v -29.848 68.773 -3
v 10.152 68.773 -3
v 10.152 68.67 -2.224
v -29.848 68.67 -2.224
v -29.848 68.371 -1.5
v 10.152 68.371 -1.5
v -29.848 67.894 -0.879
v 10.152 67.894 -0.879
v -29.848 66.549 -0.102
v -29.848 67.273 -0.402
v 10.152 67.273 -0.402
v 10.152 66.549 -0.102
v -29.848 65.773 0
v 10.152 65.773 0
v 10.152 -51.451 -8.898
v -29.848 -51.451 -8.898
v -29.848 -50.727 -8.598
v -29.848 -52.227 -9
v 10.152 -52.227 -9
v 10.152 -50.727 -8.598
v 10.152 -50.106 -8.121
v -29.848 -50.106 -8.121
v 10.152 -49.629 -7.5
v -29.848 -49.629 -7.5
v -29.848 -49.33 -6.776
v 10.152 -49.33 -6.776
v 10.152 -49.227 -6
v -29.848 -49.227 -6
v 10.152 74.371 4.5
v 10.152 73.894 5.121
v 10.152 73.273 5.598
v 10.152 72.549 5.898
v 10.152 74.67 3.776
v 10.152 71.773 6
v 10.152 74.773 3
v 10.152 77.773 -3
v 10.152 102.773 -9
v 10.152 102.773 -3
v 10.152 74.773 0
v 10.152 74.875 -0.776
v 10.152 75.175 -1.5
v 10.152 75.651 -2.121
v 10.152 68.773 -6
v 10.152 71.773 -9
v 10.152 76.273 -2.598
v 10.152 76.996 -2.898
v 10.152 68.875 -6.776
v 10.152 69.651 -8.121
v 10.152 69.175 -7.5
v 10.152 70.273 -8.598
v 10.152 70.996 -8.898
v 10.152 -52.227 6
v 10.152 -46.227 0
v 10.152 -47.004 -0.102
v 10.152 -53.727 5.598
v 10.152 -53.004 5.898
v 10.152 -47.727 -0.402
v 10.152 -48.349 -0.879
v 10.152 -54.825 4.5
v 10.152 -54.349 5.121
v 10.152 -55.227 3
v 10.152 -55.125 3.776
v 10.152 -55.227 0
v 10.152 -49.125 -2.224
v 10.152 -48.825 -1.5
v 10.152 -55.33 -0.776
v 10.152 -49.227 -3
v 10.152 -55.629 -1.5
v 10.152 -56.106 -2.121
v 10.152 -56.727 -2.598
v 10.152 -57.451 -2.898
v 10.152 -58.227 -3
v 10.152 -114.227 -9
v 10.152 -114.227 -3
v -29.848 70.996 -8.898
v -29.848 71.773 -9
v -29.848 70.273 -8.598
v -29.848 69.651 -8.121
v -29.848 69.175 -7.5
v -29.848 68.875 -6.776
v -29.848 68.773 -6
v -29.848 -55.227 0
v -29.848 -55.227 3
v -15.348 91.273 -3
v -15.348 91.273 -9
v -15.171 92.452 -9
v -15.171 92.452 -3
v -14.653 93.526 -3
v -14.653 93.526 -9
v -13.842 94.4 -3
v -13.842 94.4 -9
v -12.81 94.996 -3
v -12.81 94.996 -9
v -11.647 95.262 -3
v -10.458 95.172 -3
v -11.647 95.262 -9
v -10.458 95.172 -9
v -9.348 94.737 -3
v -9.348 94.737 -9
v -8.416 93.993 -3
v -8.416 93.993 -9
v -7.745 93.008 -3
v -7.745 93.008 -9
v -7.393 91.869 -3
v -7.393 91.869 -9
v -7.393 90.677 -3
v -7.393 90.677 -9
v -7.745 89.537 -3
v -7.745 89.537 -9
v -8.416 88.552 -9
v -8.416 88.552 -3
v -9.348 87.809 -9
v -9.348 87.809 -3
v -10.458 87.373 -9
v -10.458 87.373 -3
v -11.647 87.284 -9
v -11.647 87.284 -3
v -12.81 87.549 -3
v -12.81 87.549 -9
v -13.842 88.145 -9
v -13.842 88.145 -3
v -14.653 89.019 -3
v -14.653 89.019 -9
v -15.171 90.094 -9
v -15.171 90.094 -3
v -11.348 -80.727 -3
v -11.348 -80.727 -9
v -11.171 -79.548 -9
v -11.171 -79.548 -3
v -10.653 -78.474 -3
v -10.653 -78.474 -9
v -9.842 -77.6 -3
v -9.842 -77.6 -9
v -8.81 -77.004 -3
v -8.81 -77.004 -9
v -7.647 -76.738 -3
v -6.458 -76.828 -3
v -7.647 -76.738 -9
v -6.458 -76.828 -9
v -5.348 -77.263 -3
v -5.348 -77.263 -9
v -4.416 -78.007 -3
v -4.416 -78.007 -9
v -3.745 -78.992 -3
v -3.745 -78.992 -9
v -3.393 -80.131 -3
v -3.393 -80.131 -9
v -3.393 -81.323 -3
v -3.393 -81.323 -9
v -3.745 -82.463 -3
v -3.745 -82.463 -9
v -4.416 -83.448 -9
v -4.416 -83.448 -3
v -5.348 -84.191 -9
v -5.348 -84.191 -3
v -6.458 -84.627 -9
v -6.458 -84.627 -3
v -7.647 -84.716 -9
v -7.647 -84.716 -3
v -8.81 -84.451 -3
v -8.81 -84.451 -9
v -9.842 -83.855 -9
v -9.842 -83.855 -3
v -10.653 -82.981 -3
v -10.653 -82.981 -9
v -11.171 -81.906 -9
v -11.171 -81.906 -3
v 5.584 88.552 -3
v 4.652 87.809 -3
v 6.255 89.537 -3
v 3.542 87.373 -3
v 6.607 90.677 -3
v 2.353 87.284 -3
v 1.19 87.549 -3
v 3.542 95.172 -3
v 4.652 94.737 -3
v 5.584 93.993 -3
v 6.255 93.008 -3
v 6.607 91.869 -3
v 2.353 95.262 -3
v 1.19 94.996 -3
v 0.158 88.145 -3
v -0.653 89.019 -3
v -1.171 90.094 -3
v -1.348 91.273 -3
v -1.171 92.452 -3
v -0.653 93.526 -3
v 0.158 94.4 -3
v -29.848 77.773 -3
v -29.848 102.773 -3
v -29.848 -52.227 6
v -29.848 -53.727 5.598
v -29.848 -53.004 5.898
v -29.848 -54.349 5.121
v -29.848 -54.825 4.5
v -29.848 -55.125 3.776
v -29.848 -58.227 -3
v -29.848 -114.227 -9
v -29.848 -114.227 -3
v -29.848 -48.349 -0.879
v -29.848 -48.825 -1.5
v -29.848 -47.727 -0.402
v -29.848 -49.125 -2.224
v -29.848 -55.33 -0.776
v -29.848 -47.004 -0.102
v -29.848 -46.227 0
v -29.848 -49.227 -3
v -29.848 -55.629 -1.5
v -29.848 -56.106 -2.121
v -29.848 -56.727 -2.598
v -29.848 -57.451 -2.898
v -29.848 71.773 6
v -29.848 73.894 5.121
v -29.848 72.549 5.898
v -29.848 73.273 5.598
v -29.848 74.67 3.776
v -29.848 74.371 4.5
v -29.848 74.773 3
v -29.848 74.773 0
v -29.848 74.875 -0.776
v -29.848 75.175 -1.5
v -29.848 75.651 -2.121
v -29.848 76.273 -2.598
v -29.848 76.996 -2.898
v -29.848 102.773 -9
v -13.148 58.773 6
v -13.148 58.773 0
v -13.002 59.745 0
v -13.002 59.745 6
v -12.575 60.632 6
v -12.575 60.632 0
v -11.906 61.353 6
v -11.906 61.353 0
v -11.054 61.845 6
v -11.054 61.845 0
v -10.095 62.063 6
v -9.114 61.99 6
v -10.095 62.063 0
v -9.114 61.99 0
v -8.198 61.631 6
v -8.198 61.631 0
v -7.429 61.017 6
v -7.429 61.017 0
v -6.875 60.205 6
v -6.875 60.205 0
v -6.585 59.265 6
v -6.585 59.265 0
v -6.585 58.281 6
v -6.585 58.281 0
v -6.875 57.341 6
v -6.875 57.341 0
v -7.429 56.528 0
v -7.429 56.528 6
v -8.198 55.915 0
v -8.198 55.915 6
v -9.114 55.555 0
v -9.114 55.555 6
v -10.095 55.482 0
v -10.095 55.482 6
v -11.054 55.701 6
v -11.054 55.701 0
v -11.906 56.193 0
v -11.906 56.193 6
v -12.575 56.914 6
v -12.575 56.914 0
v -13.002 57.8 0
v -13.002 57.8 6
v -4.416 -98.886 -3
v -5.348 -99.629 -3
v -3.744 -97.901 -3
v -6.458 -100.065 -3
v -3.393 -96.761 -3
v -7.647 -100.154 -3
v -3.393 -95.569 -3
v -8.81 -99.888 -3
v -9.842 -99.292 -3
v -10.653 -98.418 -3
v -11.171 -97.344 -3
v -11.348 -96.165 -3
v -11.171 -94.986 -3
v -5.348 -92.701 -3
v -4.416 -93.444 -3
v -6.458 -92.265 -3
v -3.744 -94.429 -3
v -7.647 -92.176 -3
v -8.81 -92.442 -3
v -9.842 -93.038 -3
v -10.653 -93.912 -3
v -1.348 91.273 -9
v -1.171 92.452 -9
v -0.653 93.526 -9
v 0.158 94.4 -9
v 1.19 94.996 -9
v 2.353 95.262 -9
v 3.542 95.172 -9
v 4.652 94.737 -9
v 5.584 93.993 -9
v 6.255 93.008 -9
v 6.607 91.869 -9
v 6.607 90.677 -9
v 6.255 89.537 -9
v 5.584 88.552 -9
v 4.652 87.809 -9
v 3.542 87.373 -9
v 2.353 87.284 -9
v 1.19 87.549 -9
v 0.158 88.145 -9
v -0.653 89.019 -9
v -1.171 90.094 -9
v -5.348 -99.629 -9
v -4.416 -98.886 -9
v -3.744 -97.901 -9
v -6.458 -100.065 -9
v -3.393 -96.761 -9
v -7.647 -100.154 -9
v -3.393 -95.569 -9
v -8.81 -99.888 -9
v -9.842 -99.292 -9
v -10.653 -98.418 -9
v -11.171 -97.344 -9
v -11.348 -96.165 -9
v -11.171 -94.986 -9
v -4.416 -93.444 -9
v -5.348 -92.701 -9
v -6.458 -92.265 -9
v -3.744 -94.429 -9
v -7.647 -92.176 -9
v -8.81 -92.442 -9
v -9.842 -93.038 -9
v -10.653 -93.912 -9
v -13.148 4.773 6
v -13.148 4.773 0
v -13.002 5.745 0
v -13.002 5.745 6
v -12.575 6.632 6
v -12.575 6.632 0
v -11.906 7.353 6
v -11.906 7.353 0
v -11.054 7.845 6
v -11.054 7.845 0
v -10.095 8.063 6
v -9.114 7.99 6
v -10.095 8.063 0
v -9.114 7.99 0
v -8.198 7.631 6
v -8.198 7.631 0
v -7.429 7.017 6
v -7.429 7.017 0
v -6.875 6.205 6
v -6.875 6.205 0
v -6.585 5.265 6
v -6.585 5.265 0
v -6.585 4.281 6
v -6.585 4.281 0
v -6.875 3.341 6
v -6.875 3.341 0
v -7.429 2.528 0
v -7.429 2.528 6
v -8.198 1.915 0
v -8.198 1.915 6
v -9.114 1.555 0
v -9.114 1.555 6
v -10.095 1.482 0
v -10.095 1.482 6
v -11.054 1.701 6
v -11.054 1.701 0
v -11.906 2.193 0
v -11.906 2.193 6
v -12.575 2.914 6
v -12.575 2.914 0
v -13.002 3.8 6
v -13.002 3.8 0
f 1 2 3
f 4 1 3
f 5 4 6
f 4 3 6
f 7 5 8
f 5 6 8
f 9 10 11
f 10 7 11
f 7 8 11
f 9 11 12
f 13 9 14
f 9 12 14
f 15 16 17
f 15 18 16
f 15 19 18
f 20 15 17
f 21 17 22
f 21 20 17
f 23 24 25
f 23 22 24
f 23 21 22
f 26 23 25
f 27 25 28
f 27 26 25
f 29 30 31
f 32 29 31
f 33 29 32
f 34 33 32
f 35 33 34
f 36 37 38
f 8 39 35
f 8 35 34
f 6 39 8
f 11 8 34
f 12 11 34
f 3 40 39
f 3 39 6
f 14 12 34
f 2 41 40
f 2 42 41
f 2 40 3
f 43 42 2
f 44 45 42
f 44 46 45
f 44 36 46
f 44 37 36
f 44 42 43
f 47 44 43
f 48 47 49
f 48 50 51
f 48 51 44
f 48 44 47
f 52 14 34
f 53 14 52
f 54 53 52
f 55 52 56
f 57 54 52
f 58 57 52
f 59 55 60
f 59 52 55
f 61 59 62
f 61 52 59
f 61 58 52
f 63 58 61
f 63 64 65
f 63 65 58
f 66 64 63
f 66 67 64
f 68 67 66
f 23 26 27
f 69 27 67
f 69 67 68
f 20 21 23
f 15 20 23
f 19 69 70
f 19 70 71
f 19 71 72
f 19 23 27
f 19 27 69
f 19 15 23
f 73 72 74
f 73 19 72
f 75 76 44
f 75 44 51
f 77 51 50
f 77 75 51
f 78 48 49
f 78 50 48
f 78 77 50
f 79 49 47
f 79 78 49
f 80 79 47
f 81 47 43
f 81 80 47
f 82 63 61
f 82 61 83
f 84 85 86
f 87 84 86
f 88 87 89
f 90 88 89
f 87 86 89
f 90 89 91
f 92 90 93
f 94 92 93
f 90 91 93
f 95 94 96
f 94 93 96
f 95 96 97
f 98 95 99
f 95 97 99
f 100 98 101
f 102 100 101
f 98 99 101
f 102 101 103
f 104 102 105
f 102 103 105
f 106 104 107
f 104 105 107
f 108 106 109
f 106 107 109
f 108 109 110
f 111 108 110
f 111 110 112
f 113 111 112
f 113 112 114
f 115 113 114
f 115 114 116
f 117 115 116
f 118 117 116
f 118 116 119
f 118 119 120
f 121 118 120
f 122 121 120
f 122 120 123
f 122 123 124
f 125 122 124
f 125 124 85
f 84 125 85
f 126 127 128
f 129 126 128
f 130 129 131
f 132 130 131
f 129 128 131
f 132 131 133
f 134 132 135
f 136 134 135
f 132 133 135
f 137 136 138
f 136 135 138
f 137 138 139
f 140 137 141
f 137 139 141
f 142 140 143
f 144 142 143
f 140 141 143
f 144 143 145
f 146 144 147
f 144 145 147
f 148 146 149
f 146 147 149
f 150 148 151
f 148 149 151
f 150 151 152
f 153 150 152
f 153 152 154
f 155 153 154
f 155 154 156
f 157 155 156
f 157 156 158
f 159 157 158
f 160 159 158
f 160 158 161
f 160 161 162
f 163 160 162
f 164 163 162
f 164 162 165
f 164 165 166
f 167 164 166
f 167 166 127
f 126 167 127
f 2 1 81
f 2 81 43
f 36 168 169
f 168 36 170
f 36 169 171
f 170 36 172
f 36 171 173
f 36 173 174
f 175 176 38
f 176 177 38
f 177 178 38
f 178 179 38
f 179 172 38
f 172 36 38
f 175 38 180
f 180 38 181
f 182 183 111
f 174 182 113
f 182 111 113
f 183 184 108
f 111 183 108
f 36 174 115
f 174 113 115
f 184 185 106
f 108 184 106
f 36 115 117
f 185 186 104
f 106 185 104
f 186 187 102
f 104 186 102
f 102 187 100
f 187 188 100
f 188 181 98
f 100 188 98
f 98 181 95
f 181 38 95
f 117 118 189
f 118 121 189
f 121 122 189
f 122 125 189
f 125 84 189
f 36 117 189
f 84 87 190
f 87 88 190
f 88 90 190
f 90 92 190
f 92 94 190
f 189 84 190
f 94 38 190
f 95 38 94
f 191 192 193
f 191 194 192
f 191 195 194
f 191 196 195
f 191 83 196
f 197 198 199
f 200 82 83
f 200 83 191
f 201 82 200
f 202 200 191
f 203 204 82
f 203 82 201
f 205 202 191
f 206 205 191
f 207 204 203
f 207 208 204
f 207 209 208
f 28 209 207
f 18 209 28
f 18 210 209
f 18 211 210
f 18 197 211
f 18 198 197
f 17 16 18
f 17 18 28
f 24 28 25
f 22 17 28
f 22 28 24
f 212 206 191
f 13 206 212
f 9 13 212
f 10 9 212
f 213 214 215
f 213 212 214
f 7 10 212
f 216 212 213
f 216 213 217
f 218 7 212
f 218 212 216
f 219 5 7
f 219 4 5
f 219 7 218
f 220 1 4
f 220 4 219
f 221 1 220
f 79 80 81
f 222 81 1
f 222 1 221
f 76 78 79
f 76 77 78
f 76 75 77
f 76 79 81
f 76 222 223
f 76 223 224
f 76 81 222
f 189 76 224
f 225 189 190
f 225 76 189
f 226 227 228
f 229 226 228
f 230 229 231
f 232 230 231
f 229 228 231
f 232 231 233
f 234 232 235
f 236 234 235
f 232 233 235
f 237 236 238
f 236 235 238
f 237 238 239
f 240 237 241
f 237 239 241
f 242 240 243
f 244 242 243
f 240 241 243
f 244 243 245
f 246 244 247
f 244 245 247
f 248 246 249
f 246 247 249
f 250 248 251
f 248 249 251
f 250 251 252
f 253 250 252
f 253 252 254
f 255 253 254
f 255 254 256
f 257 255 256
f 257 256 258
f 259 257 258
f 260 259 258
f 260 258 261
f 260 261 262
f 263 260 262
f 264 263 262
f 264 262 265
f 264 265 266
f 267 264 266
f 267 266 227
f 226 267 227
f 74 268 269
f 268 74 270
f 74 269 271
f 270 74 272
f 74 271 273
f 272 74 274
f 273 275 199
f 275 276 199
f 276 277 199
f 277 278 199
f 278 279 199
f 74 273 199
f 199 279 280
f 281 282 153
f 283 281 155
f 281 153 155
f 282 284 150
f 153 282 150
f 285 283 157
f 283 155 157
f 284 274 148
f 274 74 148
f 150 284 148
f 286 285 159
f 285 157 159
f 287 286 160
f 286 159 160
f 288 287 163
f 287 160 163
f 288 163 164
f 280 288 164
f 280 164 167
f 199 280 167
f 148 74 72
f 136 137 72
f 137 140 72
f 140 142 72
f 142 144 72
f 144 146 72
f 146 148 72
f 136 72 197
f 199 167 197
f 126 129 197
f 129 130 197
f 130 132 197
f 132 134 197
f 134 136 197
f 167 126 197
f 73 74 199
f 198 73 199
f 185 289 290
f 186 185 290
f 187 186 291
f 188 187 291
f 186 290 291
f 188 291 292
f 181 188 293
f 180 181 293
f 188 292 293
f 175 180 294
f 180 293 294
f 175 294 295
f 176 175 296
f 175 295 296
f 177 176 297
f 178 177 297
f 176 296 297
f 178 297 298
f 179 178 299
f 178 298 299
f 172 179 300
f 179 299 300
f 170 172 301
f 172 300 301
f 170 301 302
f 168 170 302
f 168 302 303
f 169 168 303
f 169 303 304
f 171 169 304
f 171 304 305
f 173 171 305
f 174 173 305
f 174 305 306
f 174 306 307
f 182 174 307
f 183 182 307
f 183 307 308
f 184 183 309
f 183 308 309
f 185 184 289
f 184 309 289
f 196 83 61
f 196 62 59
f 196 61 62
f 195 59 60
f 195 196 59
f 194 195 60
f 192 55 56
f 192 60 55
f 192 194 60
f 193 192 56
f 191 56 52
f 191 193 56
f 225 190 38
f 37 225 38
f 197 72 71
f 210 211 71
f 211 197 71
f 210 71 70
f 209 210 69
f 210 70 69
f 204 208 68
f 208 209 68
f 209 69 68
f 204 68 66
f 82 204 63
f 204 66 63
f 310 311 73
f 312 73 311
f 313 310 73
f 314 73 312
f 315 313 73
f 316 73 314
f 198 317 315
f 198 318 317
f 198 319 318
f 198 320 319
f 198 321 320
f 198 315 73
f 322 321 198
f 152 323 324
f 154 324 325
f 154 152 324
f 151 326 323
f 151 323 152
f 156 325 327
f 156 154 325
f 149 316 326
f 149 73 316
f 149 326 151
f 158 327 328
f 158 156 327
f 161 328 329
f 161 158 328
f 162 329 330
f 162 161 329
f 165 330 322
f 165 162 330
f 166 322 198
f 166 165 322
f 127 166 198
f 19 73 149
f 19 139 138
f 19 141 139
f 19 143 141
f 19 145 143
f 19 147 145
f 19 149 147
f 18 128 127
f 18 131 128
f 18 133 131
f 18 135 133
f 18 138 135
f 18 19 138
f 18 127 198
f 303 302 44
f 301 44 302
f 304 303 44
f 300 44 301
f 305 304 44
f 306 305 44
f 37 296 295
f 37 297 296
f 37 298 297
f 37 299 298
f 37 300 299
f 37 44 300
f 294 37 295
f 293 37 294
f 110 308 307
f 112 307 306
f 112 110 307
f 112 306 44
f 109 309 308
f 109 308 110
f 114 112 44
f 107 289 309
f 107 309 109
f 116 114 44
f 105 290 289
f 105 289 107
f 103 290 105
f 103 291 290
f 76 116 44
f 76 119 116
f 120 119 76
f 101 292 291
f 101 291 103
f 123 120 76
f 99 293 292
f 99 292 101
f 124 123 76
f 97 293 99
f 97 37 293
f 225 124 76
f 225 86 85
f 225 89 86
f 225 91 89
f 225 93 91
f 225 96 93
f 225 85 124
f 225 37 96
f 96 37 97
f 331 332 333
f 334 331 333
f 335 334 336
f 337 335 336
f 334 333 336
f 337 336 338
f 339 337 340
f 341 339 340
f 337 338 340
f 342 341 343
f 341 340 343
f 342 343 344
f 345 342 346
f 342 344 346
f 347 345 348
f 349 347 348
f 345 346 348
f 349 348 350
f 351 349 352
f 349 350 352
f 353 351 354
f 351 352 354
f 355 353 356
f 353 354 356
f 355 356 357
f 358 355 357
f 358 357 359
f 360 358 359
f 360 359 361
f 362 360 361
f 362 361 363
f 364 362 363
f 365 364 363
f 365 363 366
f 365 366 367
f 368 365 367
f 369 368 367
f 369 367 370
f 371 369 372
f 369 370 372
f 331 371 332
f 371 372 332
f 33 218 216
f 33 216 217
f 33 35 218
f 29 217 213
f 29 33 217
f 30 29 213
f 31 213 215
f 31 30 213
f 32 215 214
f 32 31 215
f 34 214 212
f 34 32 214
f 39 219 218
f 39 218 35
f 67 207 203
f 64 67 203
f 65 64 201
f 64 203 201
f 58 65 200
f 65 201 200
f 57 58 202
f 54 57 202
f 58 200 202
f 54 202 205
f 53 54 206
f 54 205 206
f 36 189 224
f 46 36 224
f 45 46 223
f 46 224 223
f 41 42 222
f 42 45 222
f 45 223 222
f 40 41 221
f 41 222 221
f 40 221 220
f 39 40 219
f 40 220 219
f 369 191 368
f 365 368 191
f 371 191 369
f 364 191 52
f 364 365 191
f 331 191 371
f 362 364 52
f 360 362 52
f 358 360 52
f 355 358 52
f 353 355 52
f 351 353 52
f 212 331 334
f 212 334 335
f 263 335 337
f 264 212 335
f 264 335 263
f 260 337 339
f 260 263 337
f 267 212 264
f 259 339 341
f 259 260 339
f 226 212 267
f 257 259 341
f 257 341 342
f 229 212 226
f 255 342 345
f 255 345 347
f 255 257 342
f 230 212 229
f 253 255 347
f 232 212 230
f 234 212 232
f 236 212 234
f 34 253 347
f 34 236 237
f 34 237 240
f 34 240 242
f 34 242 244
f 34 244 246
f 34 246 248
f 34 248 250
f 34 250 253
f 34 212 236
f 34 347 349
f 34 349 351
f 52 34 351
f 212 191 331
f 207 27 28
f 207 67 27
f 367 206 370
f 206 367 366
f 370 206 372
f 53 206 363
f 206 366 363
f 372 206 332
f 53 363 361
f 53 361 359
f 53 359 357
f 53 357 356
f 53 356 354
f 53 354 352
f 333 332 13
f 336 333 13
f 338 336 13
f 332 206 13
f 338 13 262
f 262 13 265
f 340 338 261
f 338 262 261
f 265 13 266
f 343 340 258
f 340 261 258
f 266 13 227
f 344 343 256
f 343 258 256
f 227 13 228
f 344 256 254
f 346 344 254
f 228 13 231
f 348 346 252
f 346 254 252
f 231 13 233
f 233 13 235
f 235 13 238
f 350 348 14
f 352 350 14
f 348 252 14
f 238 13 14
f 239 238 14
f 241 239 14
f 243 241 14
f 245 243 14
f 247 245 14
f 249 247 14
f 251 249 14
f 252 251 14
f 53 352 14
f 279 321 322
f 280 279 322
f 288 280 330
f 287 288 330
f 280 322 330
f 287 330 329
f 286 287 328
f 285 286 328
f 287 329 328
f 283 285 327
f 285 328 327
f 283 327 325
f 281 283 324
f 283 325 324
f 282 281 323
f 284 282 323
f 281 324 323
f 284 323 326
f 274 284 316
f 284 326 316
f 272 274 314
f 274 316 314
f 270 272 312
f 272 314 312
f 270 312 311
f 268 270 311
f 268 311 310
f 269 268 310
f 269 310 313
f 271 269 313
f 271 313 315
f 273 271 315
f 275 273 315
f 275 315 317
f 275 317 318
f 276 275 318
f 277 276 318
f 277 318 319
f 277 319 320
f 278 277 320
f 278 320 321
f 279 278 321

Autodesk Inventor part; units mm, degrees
ref_plane "YZ Plane" through (0, 0, 0) normal (1, 0, 0) x (0, 1, 0)
ref_plane "XZ Plane" through (0, 0, 0) normal (0, 1, 0) x (-1, 0, 0)
ref_plane "XY Plane" through (0, 0, 0) normal (0, 0, 1) x (1, 0, 0)
sketch "Sketch1" plane through (0, 0, 0) normal (0, 0, 1) x (1, 0, 0)
  line L0 (-29.8485, 74.7727) -> (10.1515, 74.7727)
  line L1 (10.1515, 74.7727) -> (10.1515, -55.2273)
  line L2 (10.1515, -55.2273) -> (-29.8485, -55.2273)
  line L3 (-29.8485, -55.2273) -> (-29.8485, 74.7727)
  point P0 (0, 0)
  dimension "d0" = 40
  dimension "d1" = 130
extrude "Extrusion1" add sketch "Sketch1" along normal blind 6
sketch "Sketch2" plane through (0, 0, 0) normal (0, 0, -1) x (-1, 0, 0)
  circle A0 centre (9.8485, 58.7727) radius 3.3 projected
  circle A1 centre (9.8485, 4.7727) radius 3.3 projected
  point P0 (0, 0)
extrude "Extrusion2" cut sketch "Sketch2" against normal through all
sketch "Sketch3" plane through (0, 0, 0) normal (0, 0, -1) x (-1, 0, 0)
  line L0 (-10.1515, 74.7727) -> (-10.1515, -55.2273) projected
  line L1 (29.8485, -55.2273) -> (29.8485, 74.7727) projected
  line L2 (-10.1515, 74.7727) -> (29.8485, 74.7727)
  line L3 (29.8485, 74.7727) -> (29.8485, 68.7727)
  line L4 (29.8485, 68.7727) -> (-10.1515, 68.7727)
  line L5 (-10.1515, 68.7727) -> (-10.1515, 74.7727)
  line L6 (-10.1515, -55.2273) -> (-10.1515, 74.7727) projected
  line L7 (29.8485, -55.2273) -> (-10.1515, -55.2273)
  line L8 (-10.1515, -55.2273) -> (-10.1515, -49.2273)
  line L9 (-10.1515, -49.2273) -> (29.8485, -49.2273)
  line L10 (29.8485, -49.2273) -> (29.8485, -55.2273)
  point P0 (0, 0)
  dimension "d6" = 6
  dimension "d7" = 6
extrude "Extrusion3" add sketch "Sketch3" along normal blind 3 contours L2 L1 L4 L0 | L9 L1 L7 L0
sketch "Sketch4" plane through (0, 0, -3) normal (0, 0, -1) x (-1, 0, 0)
  line L0 (-10.1515, 68.7727) -> (29.8485, 68.7727) projected
  line L1 (-10.1515, 68.7727) -> (29.8485, 68.7727)
  line L2 (29.8485, 68.7727) -> (29.8485, 102.7727)
  line L3 (29.8485, 102.7727) -> (-10.1515, 102.7727)
  line L4 (-10.1515, 102.7727) -> (-10.1515, 68.7727)
  line L5 (29.8485, -49.2273) -> (-10.1515, -49.2273) projected
  line L6 (29.8485, -49.2273) -> (-10.1515, -49.2273)
  line L7 (-10.1515, -49.2273) -> (-10.1515, -114.2273)
  line L8 (-10.1515, -114.2273) -> (29.8485, -114.2273)
  line L9 (29.8485, -114.2273) -> (29.8485, -49.2273)
  point P0 (0, 0)
  dimension "d10" = 34
  dimension "d11" = 65
  dimension "d12" = 40
  dimension "d13" = 40
extrude "Extrusion4" add sketch "Sketch4" along normal blind 6
fillet "Fillet1" radius 3 8 edges at (-9.8485, 68.7727, 0) (-9.8485, 68.7727, -9) (-9.8485, 74.7727, -3) (-9.8485, 74.7727, 6) (-9.8485, -49.2273, 0) (-9.8485, -49.2273, -9) (-9.8485, -55.2273, -3) (-9.8485, -55.2273, 6)
sketch "Sketch5" plane through (0, 0, -9) normal (0, 0, -1) x (-1, 0, 0)
  circle A0 centre (11.3485, 91.2727) radius 4
  circle A1 centre (-2.6515, 91.2727) radius 4
  circle A2 centre (-2.6515, 91.2727) radius 4
  circle A3 centre (11.3485, 91.2727) radius 4
  circle A4 centre (-2.6515, 91.2727) radius 4
  circle A5 centre (11.3485, 91.2727) radius 4
  circle A6 centre (7.3485, -80.7273) radius 4
  circle A7 centre (7.3483, -96.165) radius 4
  point P0 (0, 0)
extrude "Extrusion5" cut sketch "Sketch5" against normal through all
properties part number "Ball screw right hand support"
